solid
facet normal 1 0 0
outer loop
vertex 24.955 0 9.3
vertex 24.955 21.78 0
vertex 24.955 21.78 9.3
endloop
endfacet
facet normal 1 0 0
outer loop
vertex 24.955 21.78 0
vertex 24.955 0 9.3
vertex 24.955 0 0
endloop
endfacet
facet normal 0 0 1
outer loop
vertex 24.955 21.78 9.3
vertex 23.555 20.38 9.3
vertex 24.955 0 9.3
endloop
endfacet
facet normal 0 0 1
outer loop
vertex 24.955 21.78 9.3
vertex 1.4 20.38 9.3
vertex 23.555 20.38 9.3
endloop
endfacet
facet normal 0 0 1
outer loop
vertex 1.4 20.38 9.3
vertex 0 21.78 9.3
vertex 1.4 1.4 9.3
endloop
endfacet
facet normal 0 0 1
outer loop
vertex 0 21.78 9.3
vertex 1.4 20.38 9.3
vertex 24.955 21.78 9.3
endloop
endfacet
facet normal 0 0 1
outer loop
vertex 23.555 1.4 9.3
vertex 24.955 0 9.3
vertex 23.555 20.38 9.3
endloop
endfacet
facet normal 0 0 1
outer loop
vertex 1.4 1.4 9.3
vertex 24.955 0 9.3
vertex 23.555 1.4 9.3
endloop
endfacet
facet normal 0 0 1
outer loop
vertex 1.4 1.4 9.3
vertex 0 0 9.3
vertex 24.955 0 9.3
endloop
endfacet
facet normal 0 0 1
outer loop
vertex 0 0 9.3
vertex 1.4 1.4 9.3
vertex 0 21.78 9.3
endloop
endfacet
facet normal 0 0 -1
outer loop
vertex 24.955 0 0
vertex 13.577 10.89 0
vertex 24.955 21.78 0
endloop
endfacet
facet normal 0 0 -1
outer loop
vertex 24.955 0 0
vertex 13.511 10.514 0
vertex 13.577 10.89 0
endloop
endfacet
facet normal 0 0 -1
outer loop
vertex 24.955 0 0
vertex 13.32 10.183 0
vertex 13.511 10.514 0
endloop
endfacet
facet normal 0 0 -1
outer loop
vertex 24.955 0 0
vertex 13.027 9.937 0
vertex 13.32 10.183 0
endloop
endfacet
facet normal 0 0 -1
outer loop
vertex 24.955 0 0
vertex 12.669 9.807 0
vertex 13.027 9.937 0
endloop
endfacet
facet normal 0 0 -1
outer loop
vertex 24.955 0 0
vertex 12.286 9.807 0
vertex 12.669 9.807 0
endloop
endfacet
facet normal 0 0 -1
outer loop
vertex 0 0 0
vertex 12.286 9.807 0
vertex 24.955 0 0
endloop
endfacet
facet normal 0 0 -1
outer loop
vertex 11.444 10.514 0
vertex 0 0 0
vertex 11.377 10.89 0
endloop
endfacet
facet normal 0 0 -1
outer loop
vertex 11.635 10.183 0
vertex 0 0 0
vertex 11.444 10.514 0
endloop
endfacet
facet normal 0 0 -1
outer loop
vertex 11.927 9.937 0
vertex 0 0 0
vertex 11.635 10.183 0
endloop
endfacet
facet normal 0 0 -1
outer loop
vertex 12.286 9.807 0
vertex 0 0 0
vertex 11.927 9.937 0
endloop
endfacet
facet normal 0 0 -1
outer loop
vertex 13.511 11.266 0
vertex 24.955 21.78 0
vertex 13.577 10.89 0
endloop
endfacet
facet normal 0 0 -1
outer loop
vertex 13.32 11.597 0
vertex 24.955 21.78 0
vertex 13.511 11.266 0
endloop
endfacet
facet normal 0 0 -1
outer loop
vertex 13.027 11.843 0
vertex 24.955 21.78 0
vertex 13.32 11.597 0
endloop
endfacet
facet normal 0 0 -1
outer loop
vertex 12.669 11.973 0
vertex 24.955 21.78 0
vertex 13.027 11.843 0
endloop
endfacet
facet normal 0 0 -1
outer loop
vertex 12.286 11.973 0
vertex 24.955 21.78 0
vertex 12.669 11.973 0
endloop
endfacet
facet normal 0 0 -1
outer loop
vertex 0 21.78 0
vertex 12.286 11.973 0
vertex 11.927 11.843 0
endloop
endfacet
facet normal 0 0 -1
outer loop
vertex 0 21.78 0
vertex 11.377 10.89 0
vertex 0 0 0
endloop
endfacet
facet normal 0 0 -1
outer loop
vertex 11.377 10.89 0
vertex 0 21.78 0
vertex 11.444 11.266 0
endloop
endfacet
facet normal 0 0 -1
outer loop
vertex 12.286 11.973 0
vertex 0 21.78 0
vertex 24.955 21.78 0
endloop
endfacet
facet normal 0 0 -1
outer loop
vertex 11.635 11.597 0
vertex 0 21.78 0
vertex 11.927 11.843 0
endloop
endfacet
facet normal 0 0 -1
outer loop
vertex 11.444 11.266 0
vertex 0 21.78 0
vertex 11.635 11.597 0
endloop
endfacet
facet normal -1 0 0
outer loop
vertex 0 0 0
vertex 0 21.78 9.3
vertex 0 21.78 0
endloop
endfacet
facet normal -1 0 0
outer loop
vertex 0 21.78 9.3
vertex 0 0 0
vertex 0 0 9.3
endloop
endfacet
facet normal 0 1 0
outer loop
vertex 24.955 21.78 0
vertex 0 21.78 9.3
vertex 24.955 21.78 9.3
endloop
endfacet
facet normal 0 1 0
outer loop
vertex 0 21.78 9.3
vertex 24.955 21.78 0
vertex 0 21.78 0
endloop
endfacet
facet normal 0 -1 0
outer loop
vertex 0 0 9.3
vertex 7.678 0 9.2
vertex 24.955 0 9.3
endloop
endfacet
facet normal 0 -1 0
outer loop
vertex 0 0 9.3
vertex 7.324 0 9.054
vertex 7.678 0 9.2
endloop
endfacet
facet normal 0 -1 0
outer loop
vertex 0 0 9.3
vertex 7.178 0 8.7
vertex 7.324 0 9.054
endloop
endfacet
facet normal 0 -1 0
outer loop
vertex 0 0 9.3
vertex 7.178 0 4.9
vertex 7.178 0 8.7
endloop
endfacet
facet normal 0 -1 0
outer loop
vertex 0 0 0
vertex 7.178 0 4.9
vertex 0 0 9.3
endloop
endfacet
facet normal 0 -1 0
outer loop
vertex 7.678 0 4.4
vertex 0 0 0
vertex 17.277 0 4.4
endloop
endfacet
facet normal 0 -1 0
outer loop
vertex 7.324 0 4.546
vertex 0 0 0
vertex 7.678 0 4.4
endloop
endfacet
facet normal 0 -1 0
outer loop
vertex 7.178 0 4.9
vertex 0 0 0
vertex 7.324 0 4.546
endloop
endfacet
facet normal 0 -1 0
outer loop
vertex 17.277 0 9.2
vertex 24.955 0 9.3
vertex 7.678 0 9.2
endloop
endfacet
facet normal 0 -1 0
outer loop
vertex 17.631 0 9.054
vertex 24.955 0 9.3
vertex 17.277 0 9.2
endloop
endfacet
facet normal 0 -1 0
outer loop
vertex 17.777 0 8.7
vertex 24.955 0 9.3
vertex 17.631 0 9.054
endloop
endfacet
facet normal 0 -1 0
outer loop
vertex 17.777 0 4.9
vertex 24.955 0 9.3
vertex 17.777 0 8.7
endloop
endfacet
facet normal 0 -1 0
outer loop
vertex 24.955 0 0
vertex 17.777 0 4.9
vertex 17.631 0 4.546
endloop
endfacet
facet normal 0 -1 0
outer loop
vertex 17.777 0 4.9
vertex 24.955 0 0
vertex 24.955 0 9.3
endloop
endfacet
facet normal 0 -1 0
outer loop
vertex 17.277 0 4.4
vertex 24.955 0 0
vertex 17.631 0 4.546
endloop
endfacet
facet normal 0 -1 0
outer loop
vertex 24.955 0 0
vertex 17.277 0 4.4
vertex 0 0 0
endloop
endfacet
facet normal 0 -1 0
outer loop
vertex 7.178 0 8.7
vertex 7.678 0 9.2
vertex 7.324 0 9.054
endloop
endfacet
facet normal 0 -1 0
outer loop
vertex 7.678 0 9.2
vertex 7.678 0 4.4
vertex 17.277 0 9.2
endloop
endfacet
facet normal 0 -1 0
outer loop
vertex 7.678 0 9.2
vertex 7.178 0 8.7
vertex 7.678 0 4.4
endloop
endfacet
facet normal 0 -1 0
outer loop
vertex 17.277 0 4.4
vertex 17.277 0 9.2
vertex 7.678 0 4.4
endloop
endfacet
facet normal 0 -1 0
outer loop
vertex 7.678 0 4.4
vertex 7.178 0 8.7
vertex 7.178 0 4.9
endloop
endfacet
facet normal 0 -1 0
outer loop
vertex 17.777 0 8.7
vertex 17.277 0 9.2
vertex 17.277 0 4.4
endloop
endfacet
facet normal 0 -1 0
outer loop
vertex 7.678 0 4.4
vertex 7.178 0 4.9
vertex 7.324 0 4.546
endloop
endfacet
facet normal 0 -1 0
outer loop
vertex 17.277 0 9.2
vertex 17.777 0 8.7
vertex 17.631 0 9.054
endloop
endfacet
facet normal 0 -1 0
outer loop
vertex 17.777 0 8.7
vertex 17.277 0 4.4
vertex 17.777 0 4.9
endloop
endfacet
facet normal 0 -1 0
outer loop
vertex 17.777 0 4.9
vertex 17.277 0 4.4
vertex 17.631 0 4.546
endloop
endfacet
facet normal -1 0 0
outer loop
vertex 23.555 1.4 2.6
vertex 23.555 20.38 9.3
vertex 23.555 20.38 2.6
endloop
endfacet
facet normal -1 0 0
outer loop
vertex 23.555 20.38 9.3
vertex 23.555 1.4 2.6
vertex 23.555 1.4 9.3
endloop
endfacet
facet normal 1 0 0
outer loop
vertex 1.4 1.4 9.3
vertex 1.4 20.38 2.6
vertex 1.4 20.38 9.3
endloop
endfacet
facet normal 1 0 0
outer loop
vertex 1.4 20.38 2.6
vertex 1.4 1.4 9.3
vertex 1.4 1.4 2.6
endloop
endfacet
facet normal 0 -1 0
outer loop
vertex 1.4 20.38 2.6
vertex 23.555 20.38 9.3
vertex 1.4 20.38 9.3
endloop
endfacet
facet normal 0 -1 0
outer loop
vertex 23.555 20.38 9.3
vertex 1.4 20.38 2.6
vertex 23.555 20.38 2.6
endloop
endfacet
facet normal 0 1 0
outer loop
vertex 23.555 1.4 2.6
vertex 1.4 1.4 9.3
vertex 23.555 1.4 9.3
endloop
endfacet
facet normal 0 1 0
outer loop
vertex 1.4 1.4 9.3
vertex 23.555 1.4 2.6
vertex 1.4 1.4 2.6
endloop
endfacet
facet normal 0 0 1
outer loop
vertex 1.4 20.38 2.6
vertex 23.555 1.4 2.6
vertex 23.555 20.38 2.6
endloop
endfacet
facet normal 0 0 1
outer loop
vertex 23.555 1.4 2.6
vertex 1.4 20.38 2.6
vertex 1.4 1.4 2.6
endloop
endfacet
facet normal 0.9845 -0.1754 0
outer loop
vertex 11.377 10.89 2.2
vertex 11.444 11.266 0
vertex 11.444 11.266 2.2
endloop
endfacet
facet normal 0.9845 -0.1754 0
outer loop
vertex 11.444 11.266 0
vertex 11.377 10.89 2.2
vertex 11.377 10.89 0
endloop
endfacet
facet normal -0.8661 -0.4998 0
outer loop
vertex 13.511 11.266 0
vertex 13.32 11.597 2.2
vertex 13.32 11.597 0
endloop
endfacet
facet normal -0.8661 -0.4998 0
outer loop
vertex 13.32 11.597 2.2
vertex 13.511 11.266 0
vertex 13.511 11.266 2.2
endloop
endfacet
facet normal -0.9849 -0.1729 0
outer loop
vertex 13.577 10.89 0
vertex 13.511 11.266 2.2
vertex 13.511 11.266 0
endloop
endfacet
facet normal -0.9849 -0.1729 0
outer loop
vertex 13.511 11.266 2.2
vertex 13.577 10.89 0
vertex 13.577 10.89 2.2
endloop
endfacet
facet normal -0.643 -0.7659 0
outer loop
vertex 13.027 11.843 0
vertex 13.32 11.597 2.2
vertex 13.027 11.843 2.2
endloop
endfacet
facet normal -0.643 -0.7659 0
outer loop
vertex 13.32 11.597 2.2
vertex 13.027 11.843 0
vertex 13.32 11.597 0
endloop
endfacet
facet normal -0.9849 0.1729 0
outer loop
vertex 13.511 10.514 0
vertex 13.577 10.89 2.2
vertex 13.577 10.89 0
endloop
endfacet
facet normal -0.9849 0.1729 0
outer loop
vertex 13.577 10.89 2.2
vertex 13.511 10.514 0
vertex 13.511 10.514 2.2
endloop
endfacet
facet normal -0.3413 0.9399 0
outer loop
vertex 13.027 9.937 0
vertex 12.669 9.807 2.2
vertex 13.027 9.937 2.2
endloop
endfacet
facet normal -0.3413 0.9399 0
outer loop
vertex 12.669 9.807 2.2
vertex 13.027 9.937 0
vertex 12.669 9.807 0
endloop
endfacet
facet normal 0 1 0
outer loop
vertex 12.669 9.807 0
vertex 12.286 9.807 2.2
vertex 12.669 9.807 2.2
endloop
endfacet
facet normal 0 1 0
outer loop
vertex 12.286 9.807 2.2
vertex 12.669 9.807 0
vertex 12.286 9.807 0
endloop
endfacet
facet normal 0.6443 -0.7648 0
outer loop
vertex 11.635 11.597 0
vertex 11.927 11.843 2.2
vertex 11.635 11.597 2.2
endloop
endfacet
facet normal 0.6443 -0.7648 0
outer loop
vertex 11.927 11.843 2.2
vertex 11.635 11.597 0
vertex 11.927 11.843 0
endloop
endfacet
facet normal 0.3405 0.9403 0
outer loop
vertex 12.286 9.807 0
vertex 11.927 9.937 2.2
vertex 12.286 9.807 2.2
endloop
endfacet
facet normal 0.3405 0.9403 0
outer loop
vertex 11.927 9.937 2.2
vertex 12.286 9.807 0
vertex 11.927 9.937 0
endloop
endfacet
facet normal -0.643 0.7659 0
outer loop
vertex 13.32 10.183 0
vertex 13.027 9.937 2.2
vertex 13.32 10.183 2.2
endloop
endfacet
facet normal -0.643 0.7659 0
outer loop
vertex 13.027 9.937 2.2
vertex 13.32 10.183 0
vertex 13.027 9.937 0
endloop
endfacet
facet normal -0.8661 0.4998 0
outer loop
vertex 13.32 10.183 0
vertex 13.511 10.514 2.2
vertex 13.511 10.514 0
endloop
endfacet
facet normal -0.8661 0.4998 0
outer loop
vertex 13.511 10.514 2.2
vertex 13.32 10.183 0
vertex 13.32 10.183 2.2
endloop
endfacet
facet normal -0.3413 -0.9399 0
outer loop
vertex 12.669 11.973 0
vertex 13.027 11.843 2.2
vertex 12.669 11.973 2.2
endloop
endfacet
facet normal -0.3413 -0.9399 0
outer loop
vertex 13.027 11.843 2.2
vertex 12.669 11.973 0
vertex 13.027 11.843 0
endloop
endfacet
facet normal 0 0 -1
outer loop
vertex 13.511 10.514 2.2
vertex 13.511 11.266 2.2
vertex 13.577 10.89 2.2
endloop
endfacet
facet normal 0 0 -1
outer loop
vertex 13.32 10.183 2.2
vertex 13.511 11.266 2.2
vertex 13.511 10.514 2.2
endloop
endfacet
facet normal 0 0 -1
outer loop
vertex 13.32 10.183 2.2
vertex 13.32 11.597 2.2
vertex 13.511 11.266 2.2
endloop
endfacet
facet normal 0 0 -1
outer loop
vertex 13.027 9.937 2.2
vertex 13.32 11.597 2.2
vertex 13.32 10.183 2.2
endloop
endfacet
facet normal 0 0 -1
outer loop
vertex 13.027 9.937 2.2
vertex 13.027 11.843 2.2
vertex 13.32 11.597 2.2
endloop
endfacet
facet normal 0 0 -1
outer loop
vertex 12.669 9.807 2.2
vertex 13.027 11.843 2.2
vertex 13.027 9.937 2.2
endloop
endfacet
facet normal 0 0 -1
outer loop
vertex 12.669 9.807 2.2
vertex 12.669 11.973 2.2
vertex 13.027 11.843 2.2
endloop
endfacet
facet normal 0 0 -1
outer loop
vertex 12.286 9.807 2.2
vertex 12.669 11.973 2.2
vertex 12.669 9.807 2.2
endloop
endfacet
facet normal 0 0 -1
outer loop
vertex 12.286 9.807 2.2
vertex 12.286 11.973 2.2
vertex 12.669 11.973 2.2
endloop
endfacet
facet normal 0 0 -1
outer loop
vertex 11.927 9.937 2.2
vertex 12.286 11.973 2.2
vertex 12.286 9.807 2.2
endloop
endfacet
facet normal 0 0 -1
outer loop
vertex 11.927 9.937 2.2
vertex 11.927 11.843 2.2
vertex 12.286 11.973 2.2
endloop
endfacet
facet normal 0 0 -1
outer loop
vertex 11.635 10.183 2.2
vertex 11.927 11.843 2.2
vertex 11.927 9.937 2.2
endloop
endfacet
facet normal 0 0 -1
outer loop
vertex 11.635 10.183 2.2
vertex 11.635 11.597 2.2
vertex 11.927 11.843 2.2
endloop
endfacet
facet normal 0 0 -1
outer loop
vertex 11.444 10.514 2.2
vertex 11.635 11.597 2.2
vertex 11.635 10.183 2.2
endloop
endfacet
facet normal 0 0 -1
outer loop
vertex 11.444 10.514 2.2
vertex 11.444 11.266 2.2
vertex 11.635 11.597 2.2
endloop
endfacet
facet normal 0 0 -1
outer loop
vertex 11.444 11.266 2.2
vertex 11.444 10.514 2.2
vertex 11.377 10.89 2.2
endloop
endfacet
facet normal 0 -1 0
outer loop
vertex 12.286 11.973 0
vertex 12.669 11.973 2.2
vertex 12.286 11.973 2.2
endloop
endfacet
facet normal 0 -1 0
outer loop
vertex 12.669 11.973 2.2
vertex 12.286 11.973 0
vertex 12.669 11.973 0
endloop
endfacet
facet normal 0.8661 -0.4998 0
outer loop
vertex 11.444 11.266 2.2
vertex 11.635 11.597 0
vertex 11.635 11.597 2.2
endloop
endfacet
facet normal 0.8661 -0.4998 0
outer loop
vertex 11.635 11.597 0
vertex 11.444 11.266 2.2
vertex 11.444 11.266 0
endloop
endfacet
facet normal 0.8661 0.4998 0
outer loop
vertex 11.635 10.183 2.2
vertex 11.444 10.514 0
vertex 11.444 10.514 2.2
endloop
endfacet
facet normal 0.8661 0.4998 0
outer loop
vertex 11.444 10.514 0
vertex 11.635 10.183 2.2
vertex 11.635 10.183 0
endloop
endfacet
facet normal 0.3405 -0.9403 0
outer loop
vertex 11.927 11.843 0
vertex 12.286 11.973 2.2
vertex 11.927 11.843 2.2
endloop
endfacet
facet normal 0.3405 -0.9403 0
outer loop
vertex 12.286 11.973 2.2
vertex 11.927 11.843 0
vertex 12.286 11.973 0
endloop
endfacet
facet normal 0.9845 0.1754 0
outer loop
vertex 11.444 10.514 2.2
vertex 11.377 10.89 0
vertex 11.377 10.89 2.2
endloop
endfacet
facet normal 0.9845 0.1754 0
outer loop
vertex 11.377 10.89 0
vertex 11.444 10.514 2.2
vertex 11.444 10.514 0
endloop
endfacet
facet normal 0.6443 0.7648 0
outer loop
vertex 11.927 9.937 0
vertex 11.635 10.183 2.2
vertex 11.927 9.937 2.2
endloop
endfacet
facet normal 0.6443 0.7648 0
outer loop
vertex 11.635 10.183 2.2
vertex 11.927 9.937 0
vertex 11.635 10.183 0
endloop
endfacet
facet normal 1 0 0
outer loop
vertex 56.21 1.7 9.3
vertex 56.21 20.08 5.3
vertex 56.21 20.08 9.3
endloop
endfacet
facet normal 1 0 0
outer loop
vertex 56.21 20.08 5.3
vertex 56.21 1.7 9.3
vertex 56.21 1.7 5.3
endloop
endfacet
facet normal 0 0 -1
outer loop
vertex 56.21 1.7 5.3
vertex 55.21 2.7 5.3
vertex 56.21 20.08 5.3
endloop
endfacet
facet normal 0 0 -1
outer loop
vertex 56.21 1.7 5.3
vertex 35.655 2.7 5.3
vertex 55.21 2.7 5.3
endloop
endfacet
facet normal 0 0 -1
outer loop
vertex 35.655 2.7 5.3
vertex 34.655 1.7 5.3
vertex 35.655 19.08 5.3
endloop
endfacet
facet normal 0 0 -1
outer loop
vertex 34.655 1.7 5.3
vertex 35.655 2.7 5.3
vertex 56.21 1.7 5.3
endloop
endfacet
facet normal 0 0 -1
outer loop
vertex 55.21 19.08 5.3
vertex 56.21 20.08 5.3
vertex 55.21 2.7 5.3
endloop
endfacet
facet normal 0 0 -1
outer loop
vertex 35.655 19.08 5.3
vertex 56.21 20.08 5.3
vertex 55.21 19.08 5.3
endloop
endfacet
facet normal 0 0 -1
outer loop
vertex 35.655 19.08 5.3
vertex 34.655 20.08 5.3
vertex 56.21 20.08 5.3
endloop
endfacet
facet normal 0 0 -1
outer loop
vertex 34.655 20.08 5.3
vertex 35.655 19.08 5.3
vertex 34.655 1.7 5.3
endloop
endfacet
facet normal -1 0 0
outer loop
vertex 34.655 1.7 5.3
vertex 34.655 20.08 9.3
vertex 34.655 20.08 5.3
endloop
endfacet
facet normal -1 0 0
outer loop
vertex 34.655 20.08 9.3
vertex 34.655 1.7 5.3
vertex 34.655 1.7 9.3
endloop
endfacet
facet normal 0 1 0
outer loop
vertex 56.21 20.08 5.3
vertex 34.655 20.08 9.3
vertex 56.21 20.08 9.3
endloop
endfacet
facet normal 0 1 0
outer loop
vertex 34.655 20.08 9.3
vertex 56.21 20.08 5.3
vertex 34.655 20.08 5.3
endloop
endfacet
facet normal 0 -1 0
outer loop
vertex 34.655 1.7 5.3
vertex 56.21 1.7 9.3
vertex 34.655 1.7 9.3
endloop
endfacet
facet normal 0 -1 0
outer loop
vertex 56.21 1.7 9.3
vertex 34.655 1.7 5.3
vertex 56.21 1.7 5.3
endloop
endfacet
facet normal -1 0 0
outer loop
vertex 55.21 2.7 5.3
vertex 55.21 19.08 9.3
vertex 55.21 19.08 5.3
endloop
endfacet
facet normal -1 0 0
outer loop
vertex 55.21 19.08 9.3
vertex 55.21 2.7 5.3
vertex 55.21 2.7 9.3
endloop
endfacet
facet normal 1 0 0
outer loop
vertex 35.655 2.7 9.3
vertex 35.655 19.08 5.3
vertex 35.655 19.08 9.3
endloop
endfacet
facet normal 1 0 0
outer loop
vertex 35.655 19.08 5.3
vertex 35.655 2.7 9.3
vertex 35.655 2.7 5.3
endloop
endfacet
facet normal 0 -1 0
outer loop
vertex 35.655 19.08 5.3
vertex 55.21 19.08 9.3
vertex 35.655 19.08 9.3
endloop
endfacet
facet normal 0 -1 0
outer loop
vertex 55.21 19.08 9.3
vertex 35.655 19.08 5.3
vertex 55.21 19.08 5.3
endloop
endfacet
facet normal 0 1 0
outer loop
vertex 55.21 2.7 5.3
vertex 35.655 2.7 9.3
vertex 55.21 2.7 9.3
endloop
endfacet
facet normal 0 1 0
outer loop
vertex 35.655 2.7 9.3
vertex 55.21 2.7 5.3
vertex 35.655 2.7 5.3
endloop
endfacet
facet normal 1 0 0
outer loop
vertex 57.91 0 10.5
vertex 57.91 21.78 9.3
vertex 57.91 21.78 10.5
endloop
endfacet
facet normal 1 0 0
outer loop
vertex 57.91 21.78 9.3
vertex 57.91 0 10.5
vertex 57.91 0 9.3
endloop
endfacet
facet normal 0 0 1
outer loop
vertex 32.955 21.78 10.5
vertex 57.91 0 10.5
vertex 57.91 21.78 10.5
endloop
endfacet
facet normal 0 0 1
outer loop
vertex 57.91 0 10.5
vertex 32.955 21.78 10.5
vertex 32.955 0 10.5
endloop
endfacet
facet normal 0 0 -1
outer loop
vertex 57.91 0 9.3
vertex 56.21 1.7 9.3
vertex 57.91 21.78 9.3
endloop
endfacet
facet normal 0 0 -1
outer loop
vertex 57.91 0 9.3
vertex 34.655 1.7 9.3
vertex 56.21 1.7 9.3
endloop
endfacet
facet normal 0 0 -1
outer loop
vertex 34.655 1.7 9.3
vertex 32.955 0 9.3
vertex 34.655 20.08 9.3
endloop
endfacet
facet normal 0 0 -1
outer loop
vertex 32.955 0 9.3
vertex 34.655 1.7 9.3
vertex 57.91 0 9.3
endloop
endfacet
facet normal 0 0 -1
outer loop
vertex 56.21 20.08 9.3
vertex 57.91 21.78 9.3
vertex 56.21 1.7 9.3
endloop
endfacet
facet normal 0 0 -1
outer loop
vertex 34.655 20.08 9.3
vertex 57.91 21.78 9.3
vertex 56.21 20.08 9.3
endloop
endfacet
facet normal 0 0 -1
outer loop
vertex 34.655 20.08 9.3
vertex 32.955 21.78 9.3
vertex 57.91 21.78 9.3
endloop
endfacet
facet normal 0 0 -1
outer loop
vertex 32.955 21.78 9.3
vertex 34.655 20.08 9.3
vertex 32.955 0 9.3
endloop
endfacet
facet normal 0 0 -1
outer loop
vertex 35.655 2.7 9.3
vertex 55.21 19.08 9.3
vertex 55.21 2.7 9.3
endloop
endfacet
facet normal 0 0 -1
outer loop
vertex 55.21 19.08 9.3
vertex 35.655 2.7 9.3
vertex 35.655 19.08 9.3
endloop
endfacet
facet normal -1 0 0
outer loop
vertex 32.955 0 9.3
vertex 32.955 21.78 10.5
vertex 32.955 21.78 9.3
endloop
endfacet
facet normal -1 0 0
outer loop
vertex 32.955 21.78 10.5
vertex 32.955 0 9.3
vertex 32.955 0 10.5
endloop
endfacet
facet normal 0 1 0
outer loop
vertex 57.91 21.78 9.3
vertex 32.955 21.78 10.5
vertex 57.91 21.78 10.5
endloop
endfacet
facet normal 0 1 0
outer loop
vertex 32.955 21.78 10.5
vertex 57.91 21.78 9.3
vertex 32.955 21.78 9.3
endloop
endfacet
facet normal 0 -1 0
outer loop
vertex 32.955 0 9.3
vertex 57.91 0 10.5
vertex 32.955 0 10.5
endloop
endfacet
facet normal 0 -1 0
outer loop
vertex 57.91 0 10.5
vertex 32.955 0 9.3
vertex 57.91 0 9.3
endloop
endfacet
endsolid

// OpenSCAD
/*
 * Interlock Ergo USB dongle enclosure - Seeed XIAO nRF52840 (BLE).
 *
 * Two parts: a tray the board rests in and a friction-fit lid. The lid's lip is
 * sized for a light press fit in PETG; sand or re-print the lid at 99% if yours
 * comes out tight. The USB-C window is cut through both parts so the lid cannot
 * be fitted the wrong way round and jam the cable.
 *
 *   mode = "base" | "lid" | "assembly"   (assembly prints both, side by side)
 *
 * Board: 20.955 x 17.78 x 1.6 mm (Seeed's official KiCad Edge.Cuts), USB-C on the
 * short edge with its shell ~1.4mm inboard of that edge, reset button on the top
 * face. The bootloader is entered by shorting the two reset pads on the back, so
 * the base has a pinhole under them instead of a button cutout.
 *
 * Note the nRF52840 XIAO is 17.78mm deep, not the 17.5mm of the older XIAO boards:
 * a 17.5mm pocket will not take it.
 */

$fa = 2;
$fs = 0.4;

board_l   = 20.955;
board_w   = 17.78;
board_t   = 1.6;   // PCB only; the USB-C shell adds ~3.3mm above it

wall      = 1.4;
floor_t   = 1.2;
lid_t     = 1.2;
standoff  = 2.6;    // floor top -> PCB underside
headroom  = 3.9;    // PCB top -> lid lip underside (clears the USB-C shell)
fit       = 0.30;   // lid lip -> wall clearance (press fit)

usb_w     = 9.6;    // USB-C shell + overmould relief
usb_h     = 3.8;

inner_l = board_l + 1.2;
inner_w = board_w + 1.2;
outer_l = inner_l + 2 * wall;
outer_w = inner_w + 2 * wall;
base_h  = floor_t + standoff + board_t + headroom;
lip_h   = 4.0;

reset_x = outer_l / 2;
reset_y = outer_w / 2;
reset_d = 2.2;

module shell() {
    difference() {
        cube([outer_l, outer_w, base_h]);
        translate([wall, wall, floor_t])
            cube([inner_l, inner_w, base_h]);
    }
}

module base() {
    difference() {
        union() {
            shell();
            // PCB rests on this ledge, 2.6mm above the floor.
            translate([wall, wall, floor_t])
                cube([inner_l, inner_w, standoff - floor_t]);
        }
        // Board recess: keeps the PCB from sliding and takes the XIAO's back pads.
        translate([wall + (inner_l - board_l) / 2, wall + (inner_w - board_w) / 2, floor_t + standoff - 0.2])
            cube([board_l, board_w, board_t + 0.6]);
        // USB-C window through the -Y short wall, centred on the connector height
        // (PCB top + ~1.6mm), not on the old whole-module height.
        translate([outer_l / 2, 0, floor_t + standoff + board_t + 1.4])
            rotate([90, 0, 0])
            linear_extrude(height = wall + 2)
            offset(r = 0.5) square([usb_w, usb_h], center = true);
        // Reset pinhole: reach the XIAO's back-side reset pads from underneath.
        translate([reset_x, reset_y, -1]) cylinder(d = reset_d, h = floor_t + 2);
    }
}

module lid() {
    difference() {
        union() {
            translate([0, 0, base_h]) cube([outer_l, outer_w, lid_t]);
            // Press-fit lip that drops into the base.
            translate([wall + fit, wall + fit, base_h - lip_h])
                difference() {
                    cube([inner_l - 2 * fit, inner_w - 2 * fit, lip_h]);
                    translate([1.0, 1.0, -1])
                        cube([inner_l - 2 * fit - 2.0, inner_w - 2 * fit - 2.0, lip_h + 2]);
                }
        }
        // Same USB-C window, so the lid has one correct orientation.
        translate([outer_l / 2, 0, floor_t + standoff + board_t + 1.4])
            rotate([90, 0, 0])
            linear_extrude(height = wall + 2)
            offset(r = 0.5) square([usb_w, usb_h], center = true);
    }
}

mode = "assembly";

if (mode == "base") {
    base();
} else if (mode == "lid") {
    lid();
} else {
    base();
    translate([outer_l + 8, 0, 0]) lid();
}
